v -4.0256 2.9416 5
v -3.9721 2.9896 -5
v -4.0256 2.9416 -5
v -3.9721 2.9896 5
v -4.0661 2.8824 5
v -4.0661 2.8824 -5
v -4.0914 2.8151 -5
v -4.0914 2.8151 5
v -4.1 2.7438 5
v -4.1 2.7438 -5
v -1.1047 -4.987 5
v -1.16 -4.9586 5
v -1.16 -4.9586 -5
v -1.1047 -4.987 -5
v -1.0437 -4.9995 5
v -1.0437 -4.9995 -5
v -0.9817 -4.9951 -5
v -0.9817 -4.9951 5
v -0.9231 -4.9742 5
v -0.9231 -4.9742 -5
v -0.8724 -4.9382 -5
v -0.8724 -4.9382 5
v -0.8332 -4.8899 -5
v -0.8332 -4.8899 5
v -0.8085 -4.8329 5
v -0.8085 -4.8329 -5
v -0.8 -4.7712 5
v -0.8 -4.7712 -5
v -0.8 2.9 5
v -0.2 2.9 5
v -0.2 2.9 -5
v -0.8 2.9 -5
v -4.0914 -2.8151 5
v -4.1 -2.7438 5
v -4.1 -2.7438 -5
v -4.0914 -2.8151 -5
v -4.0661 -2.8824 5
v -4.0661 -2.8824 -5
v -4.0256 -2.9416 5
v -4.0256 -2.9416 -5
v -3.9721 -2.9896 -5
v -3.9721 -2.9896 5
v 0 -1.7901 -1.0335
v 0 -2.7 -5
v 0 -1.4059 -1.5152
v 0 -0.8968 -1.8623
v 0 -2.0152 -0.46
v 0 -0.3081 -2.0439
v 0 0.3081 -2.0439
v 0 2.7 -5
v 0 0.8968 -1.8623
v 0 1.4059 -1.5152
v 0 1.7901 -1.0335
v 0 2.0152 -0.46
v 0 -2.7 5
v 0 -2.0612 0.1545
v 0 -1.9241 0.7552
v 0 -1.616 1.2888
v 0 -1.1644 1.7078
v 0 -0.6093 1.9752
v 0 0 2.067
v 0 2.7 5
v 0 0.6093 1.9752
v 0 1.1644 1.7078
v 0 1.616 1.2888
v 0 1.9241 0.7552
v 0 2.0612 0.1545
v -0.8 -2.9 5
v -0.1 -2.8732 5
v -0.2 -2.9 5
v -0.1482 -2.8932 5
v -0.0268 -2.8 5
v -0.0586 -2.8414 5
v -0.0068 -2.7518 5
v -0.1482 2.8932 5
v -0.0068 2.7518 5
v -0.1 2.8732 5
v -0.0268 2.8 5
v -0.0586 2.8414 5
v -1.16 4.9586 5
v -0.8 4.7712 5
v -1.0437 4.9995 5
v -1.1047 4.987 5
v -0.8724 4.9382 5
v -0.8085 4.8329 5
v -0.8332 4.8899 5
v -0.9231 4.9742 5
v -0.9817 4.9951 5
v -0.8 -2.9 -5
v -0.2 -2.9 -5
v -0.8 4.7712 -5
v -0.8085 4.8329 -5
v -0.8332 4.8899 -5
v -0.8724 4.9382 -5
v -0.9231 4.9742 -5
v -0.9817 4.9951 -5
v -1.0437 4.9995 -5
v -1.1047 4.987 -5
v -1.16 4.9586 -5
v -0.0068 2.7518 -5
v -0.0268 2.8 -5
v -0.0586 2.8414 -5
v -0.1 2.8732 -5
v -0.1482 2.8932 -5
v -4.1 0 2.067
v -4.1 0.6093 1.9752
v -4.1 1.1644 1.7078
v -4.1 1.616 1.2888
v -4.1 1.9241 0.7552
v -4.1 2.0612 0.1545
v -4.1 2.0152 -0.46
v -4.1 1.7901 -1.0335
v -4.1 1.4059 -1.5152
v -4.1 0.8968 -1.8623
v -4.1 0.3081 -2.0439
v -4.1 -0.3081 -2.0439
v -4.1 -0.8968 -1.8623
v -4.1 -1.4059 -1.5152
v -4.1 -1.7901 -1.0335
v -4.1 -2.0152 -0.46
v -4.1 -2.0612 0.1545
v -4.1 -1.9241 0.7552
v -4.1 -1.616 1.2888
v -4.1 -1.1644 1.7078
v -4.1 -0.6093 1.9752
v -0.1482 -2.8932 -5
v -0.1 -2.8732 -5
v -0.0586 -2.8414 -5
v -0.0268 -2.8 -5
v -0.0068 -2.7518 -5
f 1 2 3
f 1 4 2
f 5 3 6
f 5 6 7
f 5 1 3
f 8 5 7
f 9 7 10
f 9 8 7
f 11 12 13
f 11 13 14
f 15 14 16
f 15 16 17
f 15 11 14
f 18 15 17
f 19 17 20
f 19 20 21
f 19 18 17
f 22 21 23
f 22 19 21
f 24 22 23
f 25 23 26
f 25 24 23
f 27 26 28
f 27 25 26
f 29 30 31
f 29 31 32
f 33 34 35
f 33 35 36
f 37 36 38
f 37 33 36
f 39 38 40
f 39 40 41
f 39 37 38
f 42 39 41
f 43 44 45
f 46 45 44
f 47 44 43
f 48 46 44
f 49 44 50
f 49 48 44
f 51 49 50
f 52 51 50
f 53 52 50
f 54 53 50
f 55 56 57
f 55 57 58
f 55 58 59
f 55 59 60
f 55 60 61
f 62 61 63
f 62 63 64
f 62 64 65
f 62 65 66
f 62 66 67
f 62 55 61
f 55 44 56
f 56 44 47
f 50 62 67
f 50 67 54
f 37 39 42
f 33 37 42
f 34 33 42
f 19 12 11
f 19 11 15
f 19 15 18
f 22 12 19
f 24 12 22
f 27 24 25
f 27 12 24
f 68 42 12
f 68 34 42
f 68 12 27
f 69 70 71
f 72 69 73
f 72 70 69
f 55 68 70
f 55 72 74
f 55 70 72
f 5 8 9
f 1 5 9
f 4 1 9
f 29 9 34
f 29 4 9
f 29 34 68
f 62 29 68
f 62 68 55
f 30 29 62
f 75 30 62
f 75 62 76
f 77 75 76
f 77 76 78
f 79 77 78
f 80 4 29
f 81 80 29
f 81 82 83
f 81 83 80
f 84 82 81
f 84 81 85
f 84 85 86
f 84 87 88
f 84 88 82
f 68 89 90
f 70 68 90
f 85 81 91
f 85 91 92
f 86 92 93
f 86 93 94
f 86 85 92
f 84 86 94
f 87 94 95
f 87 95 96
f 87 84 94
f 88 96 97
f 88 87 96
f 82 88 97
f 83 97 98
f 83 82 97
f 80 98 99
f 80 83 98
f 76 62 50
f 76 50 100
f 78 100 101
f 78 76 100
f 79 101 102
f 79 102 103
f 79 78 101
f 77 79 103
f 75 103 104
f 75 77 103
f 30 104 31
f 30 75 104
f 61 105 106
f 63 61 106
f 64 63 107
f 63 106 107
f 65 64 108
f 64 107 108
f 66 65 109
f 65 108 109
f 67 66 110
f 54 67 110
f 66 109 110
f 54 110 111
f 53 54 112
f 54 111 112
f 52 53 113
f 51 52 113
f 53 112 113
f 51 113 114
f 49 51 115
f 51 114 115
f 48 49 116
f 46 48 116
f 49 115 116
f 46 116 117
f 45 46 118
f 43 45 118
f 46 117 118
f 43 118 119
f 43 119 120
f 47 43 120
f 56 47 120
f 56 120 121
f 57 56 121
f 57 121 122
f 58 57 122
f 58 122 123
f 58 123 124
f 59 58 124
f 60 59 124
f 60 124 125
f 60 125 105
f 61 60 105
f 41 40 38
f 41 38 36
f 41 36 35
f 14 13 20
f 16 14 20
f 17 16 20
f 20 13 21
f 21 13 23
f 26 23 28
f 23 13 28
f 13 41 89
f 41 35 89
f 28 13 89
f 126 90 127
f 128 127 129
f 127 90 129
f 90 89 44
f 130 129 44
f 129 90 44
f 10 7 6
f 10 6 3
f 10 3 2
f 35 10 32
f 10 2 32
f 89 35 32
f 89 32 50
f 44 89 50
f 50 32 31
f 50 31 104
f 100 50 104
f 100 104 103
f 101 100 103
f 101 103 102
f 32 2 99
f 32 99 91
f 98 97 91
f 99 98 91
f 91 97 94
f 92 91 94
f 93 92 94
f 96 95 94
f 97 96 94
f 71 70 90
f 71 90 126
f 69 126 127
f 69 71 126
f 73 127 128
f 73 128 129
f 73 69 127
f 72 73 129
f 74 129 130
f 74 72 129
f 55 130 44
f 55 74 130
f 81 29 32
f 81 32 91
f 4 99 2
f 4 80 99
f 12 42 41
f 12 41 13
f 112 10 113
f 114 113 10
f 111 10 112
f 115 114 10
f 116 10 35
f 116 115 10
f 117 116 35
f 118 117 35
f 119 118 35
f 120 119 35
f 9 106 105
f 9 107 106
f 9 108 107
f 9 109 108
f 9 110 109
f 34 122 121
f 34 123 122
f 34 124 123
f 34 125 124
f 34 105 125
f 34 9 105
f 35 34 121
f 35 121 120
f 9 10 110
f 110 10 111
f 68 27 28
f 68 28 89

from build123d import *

# Parameters (mm, degrees)
BOSS_EXTRUDE1_DEPTH = 5
TAP1_D              = 4.134


with BuildPart() as part:
    # Sketch1 → Boss-Extrude1 (new, symmetric)
    with BuildSketch(Plane.XY):
        with BuildLine():
            Line((-4.1, 2.743829885), (-4.1, -2.743829885))
            ThreePointArc((-4.1, -2.743829885), (-4.06610325, -2.882354469), (-3.972072931, -2.989575498))
            Line((-3.972072931, -2.989575498), (-1.159973062, -4.958629024))
            ThreePointArc((-1.159973062, -4.958629024), (-0.923130974, -4.974152475), (-0.8, -4.771238909))
            Line((-0.8, -4.771238909), (-0.8, -2.9))
            Line((-0.8, -2.9), (-0.2, -2.9))
            ThreePointArc((-0.2, -2.9), (-0.058578644, -2.841421356), (0, -2.7))
            Line((0, -2.7), (0, 2.7))
            ThreePointArc((0, 2.7), (-0.058578644, 2.841421356), (-0.2, 2.9))
            Line((-0.2, 2.9), (-0.8, 2.9))
            Line((-0.8, 2.9), (-0.8, 4.771238909))
            ThreePointArc((-0.8, 4.771238909), (-0.923130974, 4.974152475), (-1.159973062, 4.958629024))
            Line((-1.159973062, 4.958629024), (-3.972072931, 2.989575498))
            ThreePointArc((-3.972072931, 2.989575498), (-4.06610325, 2.882354469), (-4.1, 2.743829885))
        make_face()
    extrude(amount=BOSS_EXTRUDE1_DEPTH, both=True)

    # Tap1 (through all)
    with Locations(Plane(origin=(0, 0, 0), x_dir=(0, 0, -1), z_dir=(1, 0, 0))):
        with Locations((0, 0)):
            Hole(TAP1_D / 2)


solid = part.part
